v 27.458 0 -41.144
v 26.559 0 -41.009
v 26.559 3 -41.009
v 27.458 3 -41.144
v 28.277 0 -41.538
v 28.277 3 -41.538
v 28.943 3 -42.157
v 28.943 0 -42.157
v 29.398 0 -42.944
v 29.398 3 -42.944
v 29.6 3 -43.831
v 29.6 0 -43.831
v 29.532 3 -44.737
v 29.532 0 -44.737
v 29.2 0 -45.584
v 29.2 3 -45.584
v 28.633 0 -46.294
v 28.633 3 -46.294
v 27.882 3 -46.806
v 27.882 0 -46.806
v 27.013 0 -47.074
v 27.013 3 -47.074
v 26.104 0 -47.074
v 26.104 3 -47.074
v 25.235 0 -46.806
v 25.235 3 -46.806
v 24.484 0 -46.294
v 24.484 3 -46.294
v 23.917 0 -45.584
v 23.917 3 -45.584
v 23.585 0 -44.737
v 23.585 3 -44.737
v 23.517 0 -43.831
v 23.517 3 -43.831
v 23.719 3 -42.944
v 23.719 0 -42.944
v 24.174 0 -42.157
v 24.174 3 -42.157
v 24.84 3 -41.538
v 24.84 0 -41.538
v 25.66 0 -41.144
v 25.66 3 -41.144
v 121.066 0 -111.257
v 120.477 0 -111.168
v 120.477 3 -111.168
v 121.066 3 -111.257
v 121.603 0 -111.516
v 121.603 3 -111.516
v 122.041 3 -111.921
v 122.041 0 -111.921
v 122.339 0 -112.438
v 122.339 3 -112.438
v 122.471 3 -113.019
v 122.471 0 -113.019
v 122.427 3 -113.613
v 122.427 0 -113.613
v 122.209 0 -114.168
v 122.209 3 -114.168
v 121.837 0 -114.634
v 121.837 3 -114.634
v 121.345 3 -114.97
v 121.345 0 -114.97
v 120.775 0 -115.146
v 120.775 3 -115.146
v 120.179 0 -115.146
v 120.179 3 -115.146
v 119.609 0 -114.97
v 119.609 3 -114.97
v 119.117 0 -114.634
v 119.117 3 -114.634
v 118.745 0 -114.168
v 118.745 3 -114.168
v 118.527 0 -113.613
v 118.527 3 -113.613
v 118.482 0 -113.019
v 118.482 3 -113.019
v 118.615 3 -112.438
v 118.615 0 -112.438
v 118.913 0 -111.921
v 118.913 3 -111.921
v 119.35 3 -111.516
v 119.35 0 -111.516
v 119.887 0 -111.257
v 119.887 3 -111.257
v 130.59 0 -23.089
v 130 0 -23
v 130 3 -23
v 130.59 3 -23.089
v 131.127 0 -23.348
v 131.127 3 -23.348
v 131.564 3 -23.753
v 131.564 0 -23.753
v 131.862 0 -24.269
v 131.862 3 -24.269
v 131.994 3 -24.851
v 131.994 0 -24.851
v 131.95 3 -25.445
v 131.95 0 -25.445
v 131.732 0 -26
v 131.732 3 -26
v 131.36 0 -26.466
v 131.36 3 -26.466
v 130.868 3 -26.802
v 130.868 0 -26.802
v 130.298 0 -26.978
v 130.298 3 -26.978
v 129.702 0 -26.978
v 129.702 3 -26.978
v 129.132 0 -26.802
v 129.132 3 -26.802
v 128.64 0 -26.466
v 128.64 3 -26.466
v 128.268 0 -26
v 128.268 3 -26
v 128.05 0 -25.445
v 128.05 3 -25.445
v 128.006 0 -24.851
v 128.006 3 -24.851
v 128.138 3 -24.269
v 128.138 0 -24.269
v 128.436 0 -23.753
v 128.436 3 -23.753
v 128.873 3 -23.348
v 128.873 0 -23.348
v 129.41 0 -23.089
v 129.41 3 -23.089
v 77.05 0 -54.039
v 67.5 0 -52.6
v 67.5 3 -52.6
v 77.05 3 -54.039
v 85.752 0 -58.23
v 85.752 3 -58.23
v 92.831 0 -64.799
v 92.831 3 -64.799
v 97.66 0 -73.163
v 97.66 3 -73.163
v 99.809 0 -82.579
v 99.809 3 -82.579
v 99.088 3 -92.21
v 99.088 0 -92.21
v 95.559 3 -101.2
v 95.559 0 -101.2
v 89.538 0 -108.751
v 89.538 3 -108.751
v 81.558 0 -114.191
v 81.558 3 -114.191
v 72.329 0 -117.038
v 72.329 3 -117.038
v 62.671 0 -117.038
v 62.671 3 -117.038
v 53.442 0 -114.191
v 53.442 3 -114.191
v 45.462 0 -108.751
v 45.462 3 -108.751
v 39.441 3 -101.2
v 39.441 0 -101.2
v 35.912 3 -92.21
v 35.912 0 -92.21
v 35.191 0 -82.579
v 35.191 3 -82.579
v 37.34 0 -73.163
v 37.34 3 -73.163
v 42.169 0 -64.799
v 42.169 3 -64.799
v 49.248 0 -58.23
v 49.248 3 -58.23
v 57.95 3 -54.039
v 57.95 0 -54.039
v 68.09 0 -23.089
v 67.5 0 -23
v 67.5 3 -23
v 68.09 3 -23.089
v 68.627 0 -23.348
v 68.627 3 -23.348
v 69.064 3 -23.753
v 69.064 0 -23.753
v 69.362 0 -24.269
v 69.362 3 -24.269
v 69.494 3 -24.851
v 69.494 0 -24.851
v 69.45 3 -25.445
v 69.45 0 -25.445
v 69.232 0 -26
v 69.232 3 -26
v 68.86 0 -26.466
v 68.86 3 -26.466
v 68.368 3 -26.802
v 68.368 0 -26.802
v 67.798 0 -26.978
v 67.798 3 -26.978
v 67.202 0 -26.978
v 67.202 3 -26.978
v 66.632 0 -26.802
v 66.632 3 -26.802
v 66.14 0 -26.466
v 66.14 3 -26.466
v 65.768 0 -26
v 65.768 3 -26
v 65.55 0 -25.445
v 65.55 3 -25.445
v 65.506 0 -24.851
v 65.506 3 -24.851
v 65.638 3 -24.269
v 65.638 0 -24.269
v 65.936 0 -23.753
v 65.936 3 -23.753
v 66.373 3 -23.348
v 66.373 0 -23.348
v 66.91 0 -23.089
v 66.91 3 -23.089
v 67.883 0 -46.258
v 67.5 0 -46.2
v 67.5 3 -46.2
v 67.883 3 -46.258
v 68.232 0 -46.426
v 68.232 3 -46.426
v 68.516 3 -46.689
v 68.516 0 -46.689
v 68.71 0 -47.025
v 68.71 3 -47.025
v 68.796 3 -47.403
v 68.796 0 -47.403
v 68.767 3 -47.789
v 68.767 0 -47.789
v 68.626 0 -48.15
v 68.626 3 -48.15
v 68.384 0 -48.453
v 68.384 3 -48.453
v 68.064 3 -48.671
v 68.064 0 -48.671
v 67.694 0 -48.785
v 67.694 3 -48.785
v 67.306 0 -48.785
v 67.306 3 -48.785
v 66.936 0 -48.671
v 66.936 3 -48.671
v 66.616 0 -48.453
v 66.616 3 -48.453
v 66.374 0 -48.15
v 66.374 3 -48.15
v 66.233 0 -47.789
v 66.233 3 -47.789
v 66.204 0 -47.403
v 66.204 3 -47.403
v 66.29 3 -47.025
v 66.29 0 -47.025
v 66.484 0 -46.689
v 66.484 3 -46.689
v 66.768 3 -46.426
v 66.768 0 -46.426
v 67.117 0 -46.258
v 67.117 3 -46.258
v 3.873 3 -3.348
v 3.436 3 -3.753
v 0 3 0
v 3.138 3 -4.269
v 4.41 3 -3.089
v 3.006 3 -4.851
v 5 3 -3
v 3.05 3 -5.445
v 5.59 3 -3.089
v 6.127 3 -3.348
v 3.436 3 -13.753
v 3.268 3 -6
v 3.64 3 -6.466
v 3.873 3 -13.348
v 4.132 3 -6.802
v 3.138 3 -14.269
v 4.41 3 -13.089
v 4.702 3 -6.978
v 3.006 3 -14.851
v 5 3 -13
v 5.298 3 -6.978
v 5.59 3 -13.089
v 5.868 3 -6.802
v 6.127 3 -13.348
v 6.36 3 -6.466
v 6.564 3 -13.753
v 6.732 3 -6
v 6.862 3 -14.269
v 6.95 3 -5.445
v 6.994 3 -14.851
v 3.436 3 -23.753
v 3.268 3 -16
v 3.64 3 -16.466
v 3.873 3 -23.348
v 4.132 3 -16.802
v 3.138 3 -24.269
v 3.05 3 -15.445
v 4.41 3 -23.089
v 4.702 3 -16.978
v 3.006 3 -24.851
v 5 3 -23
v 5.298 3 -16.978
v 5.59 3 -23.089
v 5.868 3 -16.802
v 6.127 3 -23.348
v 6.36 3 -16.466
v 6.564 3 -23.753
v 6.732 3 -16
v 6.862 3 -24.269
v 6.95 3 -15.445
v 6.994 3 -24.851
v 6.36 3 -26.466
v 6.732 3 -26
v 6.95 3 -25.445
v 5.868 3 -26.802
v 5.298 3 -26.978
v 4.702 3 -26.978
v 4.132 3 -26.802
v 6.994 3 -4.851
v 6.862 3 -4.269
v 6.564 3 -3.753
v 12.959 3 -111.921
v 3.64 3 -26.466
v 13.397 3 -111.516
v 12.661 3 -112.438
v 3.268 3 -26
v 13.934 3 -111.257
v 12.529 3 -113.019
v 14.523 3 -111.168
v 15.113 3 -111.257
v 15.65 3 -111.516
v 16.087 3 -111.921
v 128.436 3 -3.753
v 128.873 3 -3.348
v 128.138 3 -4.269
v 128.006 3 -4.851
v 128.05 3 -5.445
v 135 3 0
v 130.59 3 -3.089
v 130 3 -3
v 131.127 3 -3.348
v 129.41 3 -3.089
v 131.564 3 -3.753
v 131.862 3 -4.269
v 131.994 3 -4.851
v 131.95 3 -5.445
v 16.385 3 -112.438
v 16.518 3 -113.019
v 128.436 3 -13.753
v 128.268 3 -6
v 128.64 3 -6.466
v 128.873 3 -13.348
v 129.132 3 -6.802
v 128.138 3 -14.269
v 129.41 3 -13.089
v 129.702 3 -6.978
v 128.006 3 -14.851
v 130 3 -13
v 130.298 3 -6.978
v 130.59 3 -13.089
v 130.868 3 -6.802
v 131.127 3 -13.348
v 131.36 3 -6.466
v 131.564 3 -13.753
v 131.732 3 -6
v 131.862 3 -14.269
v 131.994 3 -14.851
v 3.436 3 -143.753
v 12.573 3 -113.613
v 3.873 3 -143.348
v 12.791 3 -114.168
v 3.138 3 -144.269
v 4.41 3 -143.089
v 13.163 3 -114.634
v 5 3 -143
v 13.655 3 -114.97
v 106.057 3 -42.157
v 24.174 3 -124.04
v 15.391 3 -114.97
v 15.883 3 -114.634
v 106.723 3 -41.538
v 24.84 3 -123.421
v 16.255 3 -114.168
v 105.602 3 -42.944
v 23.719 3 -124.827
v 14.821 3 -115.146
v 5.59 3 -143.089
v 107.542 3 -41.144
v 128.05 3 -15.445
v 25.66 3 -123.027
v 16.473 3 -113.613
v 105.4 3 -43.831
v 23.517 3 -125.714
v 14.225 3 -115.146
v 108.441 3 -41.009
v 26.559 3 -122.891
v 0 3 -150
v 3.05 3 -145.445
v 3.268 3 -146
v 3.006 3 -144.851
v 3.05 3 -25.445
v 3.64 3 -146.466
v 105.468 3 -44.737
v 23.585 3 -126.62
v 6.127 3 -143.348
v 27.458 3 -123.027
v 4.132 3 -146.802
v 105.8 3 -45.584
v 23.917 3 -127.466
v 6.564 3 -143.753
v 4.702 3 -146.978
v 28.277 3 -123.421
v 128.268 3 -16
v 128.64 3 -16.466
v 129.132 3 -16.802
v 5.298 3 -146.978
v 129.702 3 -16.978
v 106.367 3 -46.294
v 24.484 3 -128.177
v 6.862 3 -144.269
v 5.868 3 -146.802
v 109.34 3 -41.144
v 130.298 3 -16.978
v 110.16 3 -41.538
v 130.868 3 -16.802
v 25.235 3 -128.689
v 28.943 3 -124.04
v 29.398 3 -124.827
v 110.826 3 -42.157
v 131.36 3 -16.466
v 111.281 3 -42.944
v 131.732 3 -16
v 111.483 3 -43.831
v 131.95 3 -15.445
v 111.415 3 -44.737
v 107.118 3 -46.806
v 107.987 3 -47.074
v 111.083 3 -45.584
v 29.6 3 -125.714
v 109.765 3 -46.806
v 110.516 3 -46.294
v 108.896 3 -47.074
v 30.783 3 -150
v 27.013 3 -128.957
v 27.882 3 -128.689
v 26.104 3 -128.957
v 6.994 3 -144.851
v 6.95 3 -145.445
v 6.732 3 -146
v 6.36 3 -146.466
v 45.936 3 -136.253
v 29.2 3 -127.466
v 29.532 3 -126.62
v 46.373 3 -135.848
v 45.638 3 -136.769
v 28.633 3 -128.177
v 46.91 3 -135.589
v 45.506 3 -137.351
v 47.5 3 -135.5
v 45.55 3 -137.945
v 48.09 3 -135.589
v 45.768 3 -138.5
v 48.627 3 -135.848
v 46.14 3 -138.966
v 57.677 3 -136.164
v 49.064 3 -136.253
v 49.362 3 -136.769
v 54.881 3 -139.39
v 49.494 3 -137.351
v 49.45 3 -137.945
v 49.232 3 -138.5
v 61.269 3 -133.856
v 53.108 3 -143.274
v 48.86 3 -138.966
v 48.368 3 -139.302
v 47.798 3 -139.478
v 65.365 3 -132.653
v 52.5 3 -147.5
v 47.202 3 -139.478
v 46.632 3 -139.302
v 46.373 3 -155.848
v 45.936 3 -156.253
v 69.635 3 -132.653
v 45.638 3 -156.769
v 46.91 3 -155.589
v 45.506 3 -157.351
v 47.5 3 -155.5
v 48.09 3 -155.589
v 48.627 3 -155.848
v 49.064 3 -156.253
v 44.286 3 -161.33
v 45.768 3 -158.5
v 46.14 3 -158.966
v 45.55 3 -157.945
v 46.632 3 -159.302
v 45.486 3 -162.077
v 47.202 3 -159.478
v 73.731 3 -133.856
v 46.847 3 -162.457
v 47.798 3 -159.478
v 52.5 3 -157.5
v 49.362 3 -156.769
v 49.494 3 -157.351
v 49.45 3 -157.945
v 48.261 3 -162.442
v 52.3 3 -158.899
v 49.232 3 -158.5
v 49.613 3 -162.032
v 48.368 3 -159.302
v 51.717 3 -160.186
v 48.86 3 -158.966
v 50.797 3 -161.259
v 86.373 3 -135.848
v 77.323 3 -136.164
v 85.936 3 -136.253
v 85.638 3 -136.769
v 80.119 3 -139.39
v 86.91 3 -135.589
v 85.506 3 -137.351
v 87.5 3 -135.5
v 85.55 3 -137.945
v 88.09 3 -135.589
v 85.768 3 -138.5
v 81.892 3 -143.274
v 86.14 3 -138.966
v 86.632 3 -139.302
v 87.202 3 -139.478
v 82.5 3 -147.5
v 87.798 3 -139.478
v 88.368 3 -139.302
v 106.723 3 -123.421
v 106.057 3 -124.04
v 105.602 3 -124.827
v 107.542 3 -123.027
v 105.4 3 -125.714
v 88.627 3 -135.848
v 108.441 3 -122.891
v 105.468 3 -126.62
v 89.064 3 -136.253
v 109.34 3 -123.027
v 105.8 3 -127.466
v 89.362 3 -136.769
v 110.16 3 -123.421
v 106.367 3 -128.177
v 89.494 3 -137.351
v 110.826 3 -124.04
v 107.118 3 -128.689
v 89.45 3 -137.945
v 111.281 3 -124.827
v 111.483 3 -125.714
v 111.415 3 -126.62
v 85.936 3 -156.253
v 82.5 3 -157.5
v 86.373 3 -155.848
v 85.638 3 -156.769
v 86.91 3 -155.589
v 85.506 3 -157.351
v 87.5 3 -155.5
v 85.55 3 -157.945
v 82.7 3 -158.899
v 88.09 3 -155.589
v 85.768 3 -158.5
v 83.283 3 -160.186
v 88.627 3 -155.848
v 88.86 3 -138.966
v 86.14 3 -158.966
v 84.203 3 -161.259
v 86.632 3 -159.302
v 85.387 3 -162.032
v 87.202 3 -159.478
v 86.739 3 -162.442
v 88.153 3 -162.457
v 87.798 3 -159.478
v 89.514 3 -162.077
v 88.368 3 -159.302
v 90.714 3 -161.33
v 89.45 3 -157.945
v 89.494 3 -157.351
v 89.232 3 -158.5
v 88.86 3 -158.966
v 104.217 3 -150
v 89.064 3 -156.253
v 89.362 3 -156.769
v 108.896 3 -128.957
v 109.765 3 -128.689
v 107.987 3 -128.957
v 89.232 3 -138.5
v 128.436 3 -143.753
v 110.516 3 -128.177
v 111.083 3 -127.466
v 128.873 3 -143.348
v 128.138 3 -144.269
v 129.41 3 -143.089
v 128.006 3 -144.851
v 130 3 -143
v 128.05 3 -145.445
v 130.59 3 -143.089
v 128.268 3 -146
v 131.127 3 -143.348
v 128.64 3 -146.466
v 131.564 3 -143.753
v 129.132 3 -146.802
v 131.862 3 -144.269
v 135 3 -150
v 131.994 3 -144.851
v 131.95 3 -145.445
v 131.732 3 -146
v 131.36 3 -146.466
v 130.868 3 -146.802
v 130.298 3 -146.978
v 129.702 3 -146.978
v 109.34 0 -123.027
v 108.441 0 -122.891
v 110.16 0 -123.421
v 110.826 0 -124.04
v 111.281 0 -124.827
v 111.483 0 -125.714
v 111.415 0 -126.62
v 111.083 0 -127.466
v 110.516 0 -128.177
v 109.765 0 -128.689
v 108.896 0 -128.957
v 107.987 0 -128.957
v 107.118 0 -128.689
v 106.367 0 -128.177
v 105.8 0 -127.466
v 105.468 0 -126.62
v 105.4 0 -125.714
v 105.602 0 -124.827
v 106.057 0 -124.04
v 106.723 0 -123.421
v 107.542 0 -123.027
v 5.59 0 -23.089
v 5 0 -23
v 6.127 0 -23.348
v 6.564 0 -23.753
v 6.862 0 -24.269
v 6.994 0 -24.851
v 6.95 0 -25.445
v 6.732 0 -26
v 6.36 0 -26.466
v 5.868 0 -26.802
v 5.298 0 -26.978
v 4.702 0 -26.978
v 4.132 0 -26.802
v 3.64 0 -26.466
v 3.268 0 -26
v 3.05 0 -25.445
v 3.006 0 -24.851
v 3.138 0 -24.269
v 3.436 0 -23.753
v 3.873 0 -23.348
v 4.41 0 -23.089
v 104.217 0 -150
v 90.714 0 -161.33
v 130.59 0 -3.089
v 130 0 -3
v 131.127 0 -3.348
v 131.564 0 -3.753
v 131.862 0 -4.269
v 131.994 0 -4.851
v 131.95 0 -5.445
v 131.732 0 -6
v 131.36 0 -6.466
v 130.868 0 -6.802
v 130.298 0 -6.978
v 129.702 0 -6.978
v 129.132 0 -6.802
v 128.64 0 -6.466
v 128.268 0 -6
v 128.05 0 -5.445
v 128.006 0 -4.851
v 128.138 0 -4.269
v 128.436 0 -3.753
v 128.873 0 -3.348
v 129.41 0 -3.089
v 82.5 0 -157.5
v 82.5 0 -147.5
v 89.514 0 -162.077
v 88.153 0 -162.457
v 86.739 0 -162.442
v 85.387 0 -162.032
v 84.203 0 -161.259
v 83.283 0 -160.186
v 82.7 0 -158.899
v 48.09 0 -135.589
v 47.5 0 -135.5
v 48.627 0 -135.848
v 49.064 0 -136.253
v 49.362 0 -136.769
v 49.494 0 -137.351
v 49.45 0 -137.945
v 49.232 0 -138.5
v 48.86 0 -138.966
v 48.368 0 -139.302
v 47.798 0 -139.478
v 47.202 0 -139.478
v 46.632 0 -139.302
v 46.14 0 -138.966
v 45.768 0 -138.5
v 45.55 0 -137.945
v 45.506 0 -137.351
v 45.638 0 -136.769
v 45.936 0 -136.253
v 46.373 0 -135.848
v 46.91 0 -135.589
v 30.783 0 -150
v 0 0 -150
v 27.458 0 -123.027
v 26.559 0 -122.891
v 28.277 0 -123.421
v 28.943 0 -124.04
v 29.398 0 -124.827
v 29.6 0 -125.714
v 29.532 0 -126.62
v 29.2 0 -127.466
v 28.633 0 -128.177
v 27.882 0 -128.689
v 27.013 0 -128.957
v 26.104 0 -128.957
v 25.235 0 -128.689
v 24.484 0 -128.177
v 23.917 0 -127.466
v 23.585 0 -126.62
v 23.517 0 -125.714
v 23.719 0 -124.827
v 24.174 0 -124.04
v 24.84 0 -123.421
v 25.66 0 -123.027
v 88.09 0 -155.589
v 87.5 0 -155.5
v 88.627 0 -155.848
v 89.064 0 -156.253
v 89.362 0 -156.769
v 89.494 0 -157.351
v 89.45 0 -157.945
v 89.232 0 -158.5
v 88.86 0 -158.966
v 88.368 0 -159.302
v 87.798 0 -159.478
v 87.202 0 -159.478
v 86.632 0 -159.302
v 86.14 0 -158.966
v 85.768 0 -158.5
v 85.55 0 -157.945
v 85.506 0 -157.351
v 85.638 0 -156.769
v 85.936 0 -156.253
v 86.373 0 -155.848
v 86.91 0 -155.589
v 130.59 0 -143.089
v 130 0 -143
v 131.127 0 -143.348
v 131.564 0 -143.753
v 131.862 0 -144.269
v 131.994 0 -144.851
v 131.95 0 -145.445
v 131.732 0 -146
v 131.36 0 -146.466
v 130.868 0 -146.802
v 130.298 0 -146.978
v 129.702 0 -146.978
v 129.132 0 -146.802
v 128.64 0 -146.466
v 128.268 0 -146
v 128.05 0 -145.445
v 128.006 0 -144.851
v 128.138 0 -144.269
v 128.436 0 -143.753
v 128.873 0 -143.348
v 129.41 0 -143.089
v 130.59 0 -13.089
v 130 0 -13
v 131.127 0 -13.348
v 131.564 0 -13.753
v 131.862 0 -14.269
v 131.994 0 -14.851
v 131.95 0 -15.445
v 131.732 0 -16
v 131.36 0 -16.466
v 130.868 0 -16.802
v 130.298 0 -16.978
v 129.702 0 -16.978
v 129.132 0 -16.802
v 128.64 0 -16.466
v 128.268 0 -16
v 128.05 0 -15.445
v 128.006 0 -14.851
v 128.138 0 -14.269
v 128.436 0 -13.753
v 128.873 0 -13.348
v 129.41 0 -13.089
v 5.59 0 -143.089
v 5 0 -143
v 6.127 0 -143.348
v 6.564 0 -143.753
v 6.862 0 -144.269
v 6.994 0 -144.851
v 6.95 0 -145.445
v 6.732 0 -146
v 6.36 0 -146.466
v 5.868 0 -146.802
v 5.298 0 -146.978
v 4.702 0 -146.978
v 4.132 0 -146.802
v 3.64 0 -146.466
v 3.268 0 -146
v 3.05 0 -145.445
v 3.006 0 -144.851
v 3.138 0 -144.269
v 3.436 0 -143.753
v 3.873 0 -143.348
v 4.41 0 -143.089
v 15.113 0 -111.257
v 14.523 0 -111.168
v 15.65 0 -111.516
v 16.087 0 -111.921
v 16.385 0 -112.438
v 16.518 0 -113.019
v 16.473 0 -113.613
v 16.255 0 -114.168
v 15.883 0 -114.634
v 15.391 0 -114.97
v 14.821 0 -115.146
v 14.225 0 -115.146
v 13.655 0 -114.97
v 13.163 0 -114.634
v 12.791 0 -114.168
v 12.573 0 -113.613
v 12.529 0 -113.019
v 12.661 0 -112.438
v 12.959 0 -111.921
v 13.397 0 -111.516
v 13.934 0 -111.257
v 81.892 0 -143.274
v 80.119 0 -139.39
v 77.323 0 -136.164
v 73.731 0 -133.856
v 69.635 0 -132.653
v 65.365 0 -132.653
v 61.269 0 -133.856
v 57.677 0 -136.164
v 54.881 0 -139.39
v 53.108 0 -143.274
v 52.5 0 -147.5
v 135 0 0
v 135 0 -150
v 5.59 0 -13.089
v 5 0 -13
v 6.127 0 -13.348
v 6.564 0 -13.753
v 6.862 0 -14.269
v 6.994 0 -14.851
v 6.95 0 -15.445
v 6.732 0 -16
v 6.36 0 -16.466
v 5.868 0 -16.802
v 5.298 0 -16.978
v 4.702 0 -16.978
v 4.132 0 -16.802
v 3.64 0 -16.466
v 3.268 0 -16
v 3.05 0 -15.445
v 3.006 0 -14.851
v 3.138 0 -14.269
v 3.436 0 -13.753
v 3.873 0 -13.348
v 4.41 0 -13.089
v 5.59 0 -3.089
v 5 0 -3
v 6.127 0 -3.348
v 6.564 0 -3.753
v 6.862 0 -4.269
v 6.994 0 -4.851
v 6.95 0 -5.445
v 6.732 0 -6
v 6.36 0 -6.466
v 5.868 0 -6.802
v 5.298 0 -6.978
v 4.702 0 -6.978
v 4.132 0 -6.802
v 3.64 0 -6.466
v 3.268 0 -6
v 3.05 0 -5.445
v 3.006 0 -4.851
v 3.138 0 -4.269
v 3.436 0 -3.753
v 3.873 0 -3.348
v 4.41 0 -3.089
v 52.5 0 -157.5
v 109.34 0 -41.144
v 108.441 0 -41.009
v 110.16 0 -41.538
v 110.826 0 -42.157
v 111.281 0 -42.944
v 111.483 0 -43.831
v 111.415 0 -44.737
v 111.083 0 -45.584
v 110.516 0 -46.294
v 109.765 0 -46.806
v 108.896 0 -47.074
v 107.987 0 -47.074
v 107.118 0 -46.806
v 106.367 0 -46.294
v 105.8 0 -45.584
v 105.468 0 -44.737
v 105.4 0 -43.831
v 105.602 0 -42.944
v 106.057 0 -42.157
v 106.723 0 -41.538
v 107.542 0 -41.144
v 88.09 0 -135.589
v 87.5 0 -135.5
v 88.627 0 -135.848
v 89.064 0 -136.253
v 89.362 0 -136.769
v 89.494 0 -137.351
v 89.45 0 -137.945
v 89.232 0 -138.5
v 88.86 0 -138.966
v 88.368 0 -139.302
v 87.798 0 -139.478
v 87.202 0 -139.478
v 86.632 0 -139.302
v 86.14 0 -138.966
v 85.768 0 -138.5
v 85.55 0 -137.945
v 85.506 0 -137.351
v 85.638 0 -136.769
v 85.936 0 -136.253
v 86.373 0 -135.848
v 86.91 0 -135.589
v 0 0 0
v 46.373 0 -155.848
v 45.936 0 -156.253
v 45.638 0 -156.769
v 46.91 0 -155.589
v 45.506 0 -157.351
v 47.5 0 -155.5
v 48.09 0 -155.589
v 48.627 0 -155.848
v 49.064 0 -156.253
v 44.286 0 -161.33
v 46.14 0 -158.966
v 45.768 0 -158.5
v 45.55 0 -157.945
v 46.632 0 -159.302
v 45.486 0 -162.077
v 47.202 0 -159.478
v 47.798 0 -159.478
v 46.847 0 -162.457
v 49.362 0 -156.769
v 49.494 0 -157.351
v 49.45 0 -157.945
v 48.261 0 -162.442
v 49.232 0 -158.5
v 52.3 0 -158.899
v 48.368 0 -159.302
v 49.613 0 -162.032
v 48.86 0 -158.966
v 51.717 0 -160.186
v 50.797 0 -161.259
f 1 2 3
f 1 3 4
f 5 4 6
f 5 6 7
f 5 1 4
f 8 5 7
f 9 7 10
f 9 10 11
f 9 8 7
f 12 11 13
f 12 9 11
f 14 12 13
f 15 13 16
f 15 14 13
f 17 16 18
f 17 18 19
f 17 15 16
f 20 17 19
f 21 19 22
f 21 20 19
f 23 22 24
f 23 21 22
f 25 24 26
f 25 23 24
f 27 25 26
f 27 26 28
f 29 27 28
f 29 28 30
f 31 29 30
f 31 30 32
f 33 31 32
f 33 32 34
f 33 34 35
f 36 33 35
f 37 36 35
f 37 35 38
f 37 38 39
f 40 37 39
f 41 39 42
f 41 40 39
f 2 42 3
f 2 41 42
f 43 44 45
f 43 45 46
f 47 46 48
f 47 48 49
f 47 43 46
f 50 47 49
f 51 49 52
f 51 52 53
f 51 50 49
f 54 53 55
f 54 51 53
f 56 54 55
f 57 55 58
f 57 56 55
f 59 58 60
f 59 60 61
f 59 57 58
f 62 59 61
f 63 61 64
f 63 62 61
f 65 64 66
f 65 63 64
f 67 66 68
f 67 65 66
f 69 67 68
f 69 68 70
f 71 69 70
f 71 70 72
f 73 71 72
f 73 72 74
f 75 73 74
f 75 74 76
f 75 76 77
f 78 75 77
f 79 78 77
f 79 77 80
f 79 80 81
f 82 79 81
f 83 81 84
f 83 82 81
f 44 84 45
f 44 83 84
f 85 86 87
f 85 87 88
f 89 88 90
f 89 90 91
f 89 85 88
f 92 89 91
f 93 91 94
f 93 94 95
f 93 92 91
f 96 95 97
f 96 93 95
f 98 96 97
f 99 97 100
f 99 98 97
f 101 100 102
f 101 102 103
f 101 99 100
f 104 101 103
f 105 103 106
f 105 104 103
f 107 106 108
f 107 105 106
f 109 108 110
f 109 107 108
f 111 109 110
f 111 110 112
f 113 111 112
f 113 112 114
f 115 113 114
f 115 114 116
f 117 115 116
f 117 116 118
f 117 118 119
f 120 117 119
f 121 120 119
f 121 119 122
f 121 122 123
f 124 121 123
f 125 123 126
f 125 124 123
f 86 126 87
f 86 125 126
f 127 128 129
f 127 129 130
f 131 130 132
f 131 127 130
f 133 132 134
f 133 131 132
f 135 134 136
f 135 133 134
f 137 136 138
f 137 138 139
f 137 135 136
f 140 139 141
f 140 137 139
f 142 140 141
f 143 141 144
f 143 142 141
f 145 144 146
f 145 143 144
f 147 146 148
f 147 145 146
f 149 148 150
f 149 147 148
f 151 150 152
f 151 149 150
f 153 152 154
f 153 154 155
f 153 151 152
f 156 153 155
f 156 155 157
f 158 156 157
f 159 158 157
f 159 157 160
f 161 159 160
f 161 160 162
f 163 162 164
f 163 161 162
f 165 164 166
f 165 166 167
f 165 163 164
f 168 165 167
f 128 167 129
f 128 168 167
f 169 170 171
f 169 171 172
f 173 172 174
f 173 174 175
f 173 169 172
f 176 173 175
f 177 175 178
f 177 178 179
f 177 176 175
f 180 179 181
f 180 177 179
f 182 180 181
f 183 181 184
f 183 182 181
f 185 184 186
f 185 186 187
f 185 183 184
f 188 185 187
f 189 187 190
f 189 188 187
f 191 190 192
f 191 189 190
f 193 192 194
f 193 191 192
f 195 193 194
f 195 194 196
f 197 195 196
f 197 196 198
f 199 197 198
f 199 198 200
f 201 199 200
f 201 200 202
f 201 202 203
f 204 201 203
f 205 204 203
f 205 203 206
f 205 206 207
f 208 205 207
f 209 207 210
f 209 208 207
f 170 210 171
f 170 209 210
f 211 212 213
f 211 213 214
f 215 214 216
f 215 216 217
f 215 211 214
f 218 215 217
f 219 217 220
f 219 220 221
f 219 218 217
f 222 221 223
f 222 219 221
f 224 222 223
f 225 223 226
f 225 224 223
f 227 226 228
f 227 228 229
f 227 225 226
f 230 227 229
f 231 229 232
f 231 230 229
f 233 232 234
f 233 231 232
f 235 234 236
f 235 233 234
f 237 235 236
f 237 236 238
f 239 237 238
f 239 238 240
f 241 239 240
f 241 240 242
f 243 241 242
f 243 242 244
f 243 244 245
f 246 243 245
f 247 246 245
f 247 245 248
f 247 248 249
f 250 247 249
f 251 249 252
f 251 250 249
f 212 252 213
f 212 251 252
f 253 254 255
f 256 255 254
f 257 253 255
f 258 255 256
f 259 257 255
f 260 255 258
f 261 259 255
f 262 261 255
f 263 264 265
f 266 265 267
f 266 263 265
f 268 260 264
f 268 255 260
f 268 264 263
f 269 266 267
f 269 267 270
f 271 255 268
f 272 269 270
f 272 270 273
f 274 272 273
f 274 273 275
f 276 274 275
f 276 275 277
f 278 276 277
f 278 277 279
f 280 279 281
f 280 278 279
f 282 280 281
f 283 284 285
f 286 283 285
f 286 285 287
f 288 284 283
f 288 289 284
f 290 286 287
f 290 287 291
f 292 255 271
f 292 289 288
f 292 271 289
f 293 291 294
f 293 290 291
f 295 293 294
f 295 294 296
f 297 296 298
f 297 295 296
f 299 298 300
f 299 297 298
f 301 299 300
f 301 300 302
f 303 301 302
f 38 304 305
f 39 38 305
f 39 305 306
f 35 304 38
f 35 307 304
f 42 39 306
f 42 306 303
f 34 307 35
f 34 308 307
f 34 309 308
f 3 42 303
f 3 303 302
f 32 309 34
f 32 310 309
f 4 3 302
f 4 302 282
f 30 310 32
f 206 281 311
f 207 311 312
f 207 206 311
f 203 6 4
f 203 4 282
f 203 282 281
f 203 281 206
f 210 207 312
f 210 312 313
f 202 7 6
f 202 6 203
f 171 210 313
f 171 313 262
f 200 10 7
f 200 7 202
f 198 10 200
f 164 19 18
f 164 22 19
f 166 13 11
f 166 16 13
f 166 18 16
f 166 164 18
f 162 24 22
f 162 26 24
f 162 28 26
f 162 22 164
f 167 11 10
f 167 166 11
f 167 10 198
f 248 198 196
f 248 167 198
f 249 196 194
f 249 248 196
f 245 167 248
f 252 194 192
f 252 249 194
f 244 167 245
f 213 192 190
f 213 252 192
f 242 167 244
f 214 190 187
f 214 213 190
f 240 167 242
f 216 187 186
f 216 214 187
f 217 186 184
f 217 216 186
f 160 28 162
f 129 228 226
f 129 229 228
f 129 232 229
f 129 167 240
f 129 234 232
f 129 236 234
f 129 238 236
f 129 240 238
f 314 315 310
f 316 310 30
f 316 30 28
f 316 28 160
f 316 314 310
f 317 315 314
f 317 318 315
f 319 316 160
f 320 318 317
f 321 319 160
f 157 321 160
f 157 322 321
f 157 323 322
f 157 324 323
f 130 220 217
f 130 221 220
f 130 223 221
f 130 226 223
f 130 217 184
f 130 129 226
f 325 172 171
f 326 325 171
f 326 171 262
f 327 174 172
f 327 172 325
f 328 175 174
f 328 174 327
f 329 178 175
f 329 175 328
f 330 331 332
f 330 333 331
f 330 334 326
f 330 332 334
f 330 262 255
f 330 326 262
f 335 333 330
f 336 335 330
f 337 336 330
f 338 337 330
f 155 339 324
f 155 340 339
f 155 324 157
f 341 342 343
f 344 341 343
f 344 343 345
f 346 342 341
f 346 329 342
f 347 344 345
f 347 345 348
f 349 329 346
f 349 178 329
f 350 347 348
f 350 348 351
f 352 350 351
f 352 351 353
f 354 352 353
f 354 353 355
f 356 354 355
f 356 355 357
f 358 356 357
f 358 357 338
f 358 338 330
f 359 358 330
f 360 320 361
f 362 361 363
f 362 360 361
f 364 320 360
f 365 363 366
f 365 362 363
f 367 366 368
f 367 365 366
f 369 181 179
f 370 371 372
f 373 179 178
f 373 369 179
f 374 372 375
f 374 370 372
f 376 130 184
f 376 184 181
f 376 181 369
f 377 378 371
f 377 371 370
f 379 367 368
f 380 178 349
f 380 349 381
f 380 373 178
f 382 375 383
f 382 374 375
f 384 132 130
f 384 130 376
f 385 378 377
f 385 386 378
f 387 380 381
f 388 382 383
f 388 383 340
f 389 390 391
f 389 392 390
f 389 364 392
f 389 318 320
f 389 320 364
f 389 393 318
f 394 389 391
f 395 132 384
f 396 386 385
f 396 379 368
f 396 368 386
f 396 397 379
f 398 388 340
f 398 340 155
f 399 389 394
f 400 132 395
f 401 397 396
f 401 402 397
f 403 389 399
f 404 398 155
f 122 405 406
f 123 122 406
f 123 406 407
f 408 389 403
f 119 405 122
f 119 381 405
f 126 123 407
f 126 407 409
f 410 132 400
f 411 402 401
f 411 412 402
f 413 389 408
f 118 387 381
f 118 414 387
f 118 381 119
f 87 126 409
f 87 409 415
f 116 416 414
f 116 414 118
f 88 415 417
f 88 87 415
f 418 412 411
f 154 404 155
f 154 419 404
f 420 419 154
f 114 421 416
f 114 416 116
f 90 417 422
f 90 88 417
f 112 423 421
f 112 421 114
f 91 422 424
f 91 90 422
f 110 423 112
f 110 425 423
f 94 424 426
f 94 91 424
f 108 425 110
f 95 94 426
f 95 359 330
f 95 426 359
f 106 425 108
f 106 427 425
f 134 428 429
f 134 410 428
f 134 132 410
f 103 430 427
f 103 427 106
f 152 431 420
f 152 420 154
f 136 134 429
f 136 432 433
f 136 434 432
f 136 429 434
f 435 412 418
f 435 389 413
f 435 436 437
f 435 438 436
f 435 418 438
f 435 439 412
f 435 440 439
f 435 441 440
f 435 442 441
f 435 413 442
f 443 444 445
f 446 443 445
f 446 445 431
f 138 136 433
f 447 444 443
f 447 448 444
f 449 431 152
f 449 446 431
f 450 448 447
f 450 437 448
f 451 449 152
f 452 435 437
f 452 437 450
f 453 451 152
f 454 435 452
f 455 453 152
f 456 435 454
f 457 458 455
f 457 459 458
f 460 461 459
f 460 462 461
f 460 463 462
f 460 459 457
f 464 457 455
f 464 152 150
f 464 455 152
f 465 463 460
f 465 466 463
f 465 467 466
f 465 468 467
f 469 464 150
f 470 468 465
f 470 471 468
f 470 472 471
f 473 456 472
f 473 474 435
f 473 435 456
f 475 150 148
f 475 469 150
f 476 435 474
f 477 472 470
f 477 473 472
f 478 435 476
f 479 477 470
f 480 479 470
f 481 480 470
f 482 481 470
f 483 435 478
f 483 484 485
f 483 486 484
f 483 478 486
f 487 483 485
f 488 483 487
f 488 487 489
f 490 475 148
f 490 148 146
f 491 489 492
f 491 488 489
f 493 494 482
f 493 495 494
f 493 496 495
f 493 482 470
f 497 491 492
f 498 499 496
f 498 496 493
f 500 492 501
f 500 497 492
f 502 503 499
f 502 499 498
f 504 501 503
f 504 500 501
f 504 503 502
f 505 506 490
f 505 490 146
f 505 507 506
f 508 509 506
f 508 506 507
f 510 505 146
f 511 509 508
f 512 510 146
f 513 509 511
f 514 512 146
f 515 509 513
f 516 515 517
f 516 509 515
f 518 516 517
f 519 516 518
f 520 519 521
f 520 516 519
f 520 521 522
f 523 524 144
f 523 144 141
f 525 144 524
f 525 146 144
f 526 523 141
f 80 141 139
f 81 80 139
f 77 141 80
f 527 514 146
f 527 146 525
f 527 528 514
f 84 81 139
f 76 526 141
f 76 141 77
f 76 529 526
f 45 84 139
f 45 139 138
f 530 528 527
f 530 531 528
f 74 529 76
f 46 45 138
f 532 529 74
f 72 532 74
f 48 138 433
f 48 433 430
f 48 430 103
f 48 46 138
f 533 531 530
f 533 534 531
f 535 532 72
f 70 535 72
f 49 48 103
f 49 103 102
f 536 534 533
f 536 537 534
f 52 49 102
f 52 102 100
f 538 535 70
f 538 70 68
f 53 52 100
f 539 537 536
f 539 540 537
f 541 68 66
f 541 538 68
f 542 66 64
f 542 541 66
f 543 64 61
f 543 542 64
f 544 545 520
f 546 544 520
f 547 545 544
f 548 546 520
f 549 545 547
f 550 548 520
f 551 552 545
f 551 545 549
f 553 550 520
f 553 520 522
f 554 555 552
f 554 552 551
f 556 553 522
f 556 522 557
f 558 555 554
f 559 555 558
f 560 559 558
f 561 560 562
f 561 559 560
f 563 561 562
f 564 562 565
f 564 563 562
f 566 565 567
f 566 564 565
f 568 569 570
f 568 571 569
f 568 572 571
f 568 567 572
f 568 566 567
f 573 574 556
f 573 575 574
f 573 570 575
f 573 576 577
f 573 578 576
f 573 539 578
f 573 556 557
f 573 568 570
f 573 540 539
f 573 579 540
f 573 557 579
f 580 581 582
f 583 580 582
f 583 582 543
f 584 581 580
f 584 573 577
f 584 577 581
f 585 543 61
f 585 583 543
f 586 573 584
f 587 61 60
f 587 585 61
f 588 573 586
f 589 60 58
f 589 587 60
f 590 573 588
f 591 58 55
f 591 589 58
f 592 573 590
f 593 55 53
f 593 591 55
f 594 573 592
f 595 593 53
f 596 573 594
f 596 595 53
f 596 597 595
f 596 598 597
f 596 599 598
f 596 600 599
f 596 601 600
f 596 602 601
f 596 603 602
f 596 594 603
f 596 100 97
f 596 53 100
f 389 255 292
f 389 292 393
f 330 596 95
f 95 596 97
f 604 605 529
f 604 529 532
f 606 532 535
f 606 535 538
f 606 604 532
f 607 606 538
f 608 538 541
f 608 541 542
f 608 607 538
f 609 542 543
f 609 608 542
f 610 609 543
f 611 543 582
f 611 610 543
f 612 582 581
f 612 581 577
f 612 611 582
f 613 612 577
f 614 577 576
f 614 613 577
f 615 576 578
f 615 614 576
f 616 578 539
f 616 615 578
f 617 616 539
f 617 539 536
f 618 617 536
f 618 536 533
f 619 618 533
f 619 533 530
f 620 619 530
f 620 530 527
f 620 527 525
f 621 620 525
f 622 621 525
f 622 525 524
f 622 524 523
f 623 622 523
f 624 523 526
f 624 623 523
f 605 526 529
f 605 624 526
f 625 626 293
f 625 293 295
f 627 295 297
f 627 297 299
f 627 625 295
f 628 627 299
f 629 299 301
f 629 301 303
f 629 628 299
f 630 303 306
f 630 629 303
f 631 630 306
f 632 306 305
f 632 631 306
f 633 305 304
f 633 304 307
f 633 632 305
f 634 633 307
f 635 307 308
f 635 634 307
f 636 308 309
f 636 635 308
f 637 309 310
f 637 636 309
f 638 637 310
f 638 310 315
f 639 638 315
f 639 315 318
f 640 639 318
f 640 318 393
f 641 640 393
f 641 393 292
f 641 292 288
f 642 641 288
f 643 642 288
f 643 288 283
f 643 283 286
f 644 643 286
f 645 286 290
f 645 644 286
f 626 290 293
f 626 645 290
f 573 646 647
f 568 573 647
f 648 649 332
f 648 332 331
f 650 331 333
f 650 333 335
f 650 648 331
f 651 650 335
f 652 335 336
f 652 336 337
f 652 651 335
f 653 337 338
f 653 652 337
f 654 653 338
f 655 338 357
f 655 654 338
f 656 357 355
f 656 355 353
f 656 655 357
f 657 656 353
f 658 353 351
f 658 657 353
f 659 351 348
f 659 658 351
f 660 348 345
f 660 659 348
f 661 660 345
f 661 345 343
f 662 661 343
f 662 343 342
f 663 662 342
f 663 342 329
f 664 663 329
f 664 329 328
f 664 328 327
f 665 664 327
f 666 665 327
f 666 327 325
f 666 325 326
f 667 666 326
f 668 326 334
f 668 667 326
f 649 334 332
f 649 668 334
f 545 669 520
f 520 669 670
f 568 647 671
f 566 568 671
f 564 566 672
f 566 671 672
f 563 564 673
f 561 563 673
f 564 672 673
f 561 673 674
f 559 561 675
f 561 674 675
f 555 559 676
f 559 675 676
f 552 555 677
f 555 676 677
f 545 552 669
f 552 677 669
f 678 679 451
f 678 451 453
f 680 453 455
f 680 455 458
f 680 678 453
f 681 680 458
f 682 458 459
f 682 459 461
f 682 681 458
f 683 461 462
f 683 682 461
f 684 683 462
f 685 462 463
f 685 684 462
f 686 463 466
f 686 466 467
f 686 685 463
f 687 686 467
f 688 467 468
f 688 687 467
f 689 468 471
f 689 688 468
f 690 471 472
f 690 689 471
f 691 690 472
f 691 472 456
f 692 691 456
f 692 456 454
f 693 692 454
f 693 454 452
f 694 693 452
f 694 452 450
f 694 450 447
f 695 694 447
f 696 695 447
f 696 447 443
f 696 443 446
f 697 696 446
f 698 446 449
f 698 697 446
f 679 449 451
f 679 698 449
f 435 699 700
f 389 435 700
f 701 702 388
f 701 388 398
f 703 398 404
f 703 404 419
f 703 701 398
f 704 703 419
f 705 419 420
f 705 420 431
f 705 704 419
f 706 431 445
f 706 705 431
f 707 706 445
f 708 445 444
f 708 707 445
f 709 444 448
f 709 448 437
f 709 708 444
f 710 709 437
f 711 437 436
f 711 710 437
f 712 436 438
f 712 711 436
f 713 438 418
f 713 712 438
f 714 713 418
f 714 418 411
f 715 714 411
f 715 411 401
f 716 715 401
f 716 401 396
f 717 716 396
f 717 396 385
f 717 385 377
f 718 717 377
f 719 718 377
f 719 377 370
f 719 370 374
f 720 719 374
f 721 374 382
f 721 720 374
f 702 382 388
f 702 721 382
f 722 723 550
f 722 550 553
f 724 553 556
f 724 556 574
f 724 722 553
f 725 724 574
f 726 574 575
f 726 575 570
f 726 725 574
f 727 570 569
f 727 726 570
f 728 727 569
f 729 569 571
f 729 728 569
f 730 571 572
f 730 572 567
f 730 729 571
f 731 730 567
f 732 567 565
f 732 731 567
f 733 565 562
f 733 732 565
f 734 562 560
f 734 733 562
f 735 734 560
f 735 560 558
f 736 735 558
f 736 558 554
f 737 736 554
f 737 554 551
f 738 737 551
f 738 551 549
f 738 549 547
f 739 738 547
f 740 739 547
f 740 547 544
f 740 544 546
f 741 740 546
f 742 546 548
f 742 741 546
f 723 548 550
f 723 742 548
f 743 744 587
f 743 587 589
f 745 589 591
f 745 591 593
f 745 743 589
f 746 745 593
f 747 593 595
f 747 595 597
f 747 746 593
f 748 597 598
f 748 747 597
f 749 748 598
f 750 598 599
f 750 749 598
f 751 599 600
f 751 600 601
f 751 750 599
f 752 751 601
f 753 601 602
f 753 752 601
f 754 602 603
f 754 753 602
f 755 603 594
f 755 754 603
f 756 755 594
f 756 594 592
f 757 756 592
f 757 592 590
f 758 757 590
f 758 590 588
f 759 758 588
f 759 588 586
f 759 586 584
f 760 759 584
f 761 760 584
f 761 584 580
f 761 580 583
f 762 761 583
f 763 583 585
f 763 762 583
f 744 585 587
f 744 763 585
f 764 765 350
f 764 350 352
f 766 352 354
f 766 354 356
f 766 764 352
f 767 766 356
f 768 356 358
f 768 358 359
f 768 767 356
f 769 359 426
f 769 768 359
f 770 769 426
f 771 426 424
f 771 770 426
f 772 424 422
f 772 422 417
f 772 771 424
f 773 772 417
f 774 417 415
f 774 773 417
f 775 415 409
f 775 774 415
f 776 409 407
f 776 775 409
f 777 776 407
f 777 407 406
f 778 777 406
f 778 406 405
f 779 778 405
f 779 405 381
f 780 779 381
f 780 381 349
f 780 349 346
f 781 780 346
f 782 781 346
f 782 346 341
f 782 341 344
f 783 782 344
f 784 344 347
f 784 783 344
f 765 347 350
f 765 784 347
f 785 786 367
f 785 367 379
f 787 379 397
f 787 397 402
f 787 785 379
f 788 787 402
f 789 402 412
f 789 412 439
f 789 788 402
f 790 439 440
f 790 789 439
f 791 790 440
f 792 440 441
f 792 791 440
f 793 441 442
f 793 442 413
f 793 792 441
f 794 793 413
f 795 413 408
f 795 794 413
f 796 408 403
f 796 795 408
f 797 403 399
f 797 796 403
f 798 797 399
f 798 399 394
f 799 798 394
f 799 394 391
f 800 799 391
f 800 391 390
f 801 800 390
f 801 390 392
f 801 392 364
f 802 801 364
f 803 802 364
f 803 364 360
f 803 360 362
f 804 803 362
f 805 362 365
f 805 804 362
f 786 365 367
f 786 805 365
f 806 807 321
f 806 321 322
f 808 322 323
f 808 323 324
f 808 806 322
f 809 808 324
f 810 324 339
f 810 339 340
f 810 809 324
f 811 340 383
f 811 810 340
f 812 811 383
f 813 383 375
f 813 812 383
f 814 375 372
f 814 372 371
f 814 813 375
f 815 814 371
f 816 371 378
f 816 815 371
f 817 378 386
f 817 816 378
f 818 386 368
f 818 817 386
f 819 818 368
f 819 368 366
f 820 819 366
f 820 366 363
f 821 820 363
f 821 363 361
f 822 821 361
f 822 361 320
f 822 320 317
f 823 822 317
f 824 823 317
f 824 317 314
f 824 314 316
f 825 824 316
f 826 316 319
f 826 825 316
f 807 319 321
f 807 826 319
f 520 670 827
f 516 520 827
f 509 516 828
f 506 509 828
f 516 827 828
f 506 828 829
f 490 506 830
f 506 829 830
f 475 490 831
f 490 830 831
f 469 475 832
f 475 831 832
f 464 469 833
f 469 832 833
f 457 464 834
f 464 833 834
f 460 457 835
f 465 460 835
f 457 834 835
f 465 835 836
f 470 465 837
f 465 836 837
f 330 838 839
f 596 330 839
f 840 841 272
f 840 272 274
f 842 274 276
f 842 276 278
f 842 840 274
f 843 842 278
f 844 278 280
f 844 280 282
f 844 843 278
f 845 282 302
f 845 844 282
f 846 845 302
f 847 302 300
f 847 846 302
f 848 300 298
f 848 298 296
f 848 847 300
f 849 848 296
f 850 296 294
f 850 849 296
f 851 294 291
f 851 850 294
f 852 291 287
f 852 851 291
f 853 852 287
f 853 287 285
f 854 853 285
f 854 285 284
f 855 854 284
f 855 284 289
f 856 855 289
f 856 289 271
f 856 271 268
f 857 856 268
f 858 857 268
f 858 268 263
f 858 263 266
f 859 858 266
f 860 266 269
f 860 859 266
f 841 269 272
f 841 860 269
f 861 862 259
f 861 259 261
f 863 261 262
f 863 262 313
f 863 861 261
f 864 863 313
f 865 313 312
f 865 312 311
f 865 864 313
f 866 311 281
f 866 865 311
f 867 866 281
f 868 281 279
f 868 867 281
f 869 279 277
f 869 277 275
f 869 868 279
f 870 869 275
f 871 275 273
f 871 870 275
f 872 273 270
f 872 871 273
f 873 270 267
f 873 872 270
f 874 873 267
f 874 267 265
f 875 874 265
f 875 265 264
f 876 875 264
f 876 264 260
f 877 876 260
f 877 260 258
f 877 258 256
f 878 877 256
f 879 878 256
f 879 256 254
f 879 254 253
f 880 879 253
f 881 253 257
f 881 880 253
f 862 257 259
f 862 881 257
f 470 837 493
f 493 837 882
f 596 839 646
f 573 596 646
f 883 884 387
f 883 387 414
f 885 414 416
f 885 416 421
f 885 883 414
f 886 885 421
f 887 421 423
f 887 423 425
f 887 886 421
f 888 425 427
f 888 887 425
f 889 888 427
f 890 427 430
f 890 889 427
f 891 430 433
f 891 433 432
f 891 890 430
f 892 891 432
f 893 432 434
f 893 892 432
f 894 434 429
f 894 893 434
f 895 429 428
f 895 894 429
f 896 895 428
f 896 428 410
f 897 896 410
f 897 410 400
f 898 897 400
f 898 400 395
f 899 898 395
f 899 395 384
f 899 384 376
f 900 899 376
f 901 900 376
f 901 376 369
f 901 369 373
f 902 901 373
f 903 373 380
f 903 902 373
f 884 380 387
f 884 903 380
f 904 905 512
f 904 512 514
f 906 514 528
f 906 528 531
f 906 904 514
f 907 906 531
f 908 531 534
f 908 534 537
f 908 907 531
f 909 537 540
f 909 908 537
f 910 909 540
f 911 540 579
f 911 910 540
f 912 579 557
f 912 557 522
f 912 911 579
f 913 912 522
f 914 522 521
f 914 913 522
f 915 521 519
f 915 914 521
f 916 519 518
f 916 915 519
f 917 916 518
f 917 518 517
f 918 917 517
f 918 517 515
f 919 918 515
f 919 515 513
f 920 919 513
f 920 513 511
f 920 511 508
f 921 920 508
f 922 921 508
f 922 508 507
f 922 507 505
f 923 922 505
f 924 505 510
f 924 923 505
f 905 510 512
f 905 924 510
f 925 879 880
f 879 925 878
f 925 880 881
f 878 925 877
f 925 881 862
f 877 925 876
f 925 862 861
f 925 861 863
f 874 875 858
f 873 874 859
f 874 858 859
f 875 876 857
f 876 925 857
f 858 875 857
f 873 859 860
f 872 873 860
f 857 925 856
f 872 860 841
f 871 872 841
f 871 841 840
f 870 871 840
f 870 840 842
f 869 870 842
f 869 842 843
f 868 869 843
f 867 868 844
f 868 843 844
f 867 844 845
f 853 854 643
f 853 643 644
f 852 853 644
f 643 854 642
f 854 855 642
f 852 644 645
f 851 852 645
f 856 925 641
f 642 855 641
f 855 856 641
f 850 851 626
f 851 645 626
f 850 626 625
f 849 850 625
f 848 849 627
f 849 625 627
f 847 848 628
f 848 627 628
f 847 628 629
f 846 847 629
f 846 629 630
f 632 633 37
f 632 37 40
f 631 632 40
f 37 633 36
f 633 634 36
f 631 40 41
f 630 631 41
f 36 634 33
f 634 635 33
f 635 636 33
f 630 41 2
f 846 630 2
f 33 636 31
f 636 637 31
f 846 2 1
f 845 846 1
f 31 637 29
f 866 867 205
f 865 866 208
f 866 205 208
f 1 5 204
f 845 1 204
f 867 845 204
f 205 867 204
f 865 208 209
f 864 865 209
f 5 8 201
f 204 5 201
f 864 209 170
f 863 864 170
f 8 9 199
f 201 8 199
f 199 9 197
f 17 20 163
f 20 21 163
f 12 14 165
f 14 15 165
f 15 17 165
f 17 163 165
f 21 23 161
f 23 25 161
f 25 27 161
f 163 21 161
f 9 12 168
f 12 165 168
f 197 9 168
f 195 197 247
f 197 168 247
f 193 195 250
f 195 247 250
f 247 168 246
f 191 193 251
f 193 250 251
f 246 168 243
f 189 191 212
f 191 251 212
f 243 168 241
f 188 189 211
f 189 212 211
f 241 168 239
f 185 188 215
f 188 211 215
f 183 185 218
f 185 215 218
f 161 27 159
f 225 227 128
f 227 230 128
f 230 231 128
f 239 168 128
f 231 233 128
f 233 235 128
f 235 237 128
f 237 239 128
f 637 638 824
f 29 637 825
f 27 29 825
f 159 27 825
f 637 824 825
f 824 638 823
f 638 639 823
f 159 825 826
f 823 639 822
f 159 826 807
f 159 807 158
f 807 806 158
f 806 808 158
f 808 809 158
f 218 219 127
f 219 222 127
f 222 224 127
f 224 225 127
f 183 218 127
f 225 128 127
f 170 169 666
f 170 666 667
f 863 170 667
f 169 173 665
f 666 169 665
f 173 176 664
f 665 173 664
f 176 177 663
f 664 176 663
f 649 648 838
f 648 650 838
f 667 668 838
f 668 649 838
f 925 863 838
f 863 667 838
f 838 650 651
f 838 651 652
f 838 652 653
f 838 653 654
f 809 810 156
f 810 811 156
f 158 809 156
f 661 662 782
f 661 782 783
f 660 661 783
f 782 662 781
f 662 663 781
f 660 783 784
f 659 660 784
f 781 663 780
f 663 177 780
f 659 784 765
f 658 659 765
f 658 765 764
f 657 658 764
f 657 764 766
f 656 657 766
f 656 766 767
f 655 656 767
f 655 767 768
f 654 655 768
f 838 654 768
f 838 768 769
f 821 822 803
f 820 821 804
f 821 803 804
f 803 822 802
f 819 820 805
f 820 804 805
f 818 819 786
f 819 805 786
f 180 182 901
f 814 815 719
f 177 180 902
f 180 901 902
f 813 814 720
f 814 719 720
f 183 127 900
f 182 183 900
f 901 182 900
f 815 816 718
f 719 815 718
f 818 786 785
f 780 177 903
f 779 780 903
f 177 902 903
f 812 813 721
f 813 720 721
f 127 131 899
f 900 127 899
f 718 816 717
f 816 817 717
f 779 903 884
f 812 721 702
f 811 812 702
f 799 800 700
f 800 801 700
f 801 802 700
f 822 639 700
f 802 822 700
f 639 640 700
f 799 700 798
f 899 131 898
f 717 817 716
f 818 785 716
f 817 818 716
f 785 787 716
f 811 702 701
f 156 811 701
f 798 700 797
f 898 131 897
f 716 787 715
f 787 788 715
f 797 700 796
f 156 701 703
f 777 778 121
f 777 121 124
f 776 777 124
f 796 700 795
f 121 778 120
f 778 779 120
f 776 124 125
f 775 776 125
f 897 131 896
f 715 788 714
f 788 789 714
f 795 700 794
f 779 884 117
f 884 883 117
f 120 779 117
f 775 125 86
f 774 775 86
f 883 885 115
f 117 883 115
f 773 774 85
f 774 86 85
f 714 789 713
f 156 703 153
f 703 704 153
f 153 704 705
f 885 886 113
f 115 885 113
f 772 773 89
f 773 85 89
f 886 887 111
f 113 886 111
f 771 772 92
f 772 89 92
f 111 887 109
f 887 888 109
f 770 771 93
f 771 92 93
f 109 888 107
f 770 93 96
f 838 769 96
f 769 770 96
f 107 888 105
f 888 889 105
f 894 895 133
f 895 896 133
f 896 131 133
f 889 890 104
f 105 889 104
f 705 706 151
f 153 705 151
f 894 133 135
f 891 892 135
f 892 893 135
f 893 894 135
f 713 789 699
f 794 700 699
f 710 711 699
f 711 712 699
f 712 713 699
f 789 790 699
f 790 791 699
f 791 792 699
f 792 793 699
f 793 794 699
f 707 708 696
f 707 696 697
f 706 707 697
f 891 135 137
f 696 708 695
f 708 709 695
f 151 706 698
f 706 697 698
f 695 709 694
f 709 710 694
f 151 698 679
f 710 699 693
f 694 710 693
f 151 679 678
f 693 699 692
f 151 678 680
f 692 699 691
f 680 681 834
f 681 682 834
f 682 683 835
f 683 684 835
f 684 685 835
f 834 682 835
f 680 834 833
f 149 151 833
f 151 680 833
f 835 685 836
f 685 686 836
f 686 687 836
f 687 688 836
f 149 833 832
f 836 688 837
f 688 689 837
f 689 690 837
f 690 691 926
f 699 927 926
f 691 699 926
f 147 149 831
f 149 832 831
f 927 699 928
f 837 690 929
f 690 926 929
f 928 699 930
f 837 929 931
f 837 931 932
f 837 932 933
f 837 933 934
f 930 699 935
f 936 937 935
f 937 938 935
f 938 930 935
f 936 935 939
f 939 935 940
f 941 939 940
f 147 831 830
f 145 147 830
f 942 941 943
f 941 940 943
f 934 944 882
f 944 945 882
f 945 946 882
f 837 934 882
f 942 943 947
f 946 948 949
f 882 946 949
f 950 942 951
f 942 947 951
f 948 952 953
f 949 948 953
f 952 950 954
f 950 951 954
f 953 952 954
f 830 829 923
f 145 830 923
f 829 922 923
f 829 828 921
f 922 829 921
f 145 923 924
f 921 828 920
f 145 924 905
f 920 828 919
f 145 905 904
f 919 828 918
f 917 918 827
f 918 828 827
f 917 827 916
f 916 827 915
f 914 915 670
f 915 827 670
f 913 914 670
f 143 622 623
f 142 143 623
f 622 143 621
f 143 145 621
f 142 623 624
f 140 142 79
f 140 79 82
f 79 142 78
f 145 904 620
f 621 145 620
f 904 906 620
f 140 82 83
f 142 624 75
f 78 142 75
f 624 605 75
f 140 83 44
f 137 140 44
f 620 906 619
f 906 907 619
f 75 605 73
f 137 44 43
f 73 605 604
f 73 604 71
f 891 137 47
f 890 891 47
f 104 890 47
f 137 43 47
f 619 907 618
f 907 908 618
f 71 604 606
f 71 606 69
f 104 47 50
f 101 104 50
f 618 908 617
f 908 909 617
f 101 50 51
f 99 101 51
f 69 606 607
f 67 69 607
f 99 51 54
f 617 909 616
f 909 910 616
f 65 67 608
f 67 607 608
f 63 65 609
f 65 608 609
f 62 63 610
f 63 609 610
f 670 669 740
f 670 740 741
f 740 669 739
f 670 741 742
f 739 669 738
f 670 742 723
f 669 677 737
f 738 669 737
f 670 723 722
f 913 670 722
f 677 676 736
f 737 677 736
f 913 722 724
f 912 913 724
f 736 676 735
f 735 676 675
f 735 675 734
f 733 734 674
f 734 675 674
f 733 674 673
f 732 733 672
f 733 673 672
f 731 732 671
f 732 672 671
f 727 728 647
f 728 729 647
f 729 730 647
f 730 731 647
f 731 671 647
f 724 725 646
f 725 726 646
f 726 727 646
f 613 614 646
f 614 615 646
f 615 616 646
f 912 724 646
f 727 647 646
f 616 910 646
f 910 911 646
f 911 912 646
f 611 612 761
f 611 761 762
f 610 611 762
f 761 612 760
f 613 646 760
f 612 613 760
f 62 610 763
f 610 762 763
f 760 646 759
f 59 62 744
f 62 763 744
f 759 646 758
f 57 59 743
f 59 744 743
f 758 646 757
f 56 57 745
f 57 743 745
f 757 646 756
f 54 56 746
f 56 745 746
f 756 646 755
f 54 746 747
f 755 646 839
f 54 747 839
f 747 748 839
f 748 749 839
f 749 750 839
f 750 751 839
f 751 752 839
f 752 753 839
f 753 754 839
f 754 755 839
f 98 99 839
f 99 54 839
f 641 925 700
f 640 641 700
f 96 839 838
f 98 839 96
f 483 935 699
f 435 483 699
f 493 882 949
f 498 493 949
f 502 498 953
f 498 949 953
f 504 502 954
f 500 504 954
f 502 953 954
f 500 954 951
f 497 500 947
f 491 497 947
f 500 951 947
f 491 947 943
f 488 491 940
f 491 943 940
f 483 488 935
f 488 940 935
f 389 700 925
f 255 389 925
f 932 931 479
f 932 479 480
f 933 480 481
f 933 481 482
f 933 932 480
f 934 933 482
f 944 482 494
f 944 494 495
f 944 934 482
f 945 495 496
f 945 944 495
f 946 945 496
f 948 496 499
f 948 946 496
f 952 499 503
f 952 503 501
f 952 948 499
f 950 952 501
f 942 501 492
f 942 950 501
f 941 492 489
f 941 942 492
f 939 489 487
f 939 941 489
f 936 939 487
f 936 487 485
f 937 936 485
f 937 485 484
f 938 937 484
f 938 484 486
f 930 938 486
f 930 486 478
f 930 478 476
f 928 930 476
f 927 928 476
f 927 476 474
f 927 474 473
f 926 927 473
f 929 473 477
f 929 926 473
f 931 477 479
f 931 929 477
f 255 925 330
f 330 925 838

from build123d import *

# Parameters (mm, degrees)
SKETCH_1_R      = 2
SKETCH_1_R_2    = 3.05
SKETCH_1_R_3    = 1.3
SKETCH_1_R_4    = 32.4
EXTRUDE_1_DEPTH = 3


with BuildPart() as part:
    # ｽｹｯﾁ1 → ﾎﾞｽ - 押し出し1 (new body)
    with BuildSketch(Plane(origin=(0, 0, 0), x_dir=(1, 0, 0), z_dir=(0, 1, 0))):
        with BuildLine():
            Line((0, 150), (0, 0))
            Line((0, 0), (135, 0))
            Line((135, 0), (135, 150))
            Line((135, 150), (104.216771079, 150))
            Line((104.216771079, 150), (90.713938048, 161.330222216))
            ThreePointArc((90.713938048, 161.330222216), (85.386908691, 162.031538935), (82.5, 157.5))
            Line((82.5, 157.5), (82.5, 147.5))
            ThreePointArc((82.5, 147.5), (67.5, 132.5), (52.5, 147.5))
            Line((52.5, 147.5), (52.5, 150))
            Line((52.5, 150), (52.5, 157.5))
            ThreePointArc((52.5, 157.5), (49.613091309, 162.031538935), (44.286061952, 161.330222216))
            Line((44.286061952, 161.330222216), (30.783228921, 150))
            Line((30.783228921, 150), (0, 150))
        make_face()
        with Locations(Location((5, 5, 0), (0, 0, 270))):
            Circle(SKETCH_1_R, mode=Mode.SUBTRACT)
        with Locations(Location((5, 15, 0), (0, 0, 270))):
            Circle(SKETCH_1_R, mode=Mode.SUBTRACT)
        with Locations(Location((5, 25, 0), (0, 0, 270))):
            Circle(SKETCH_1_R, mode=Mode.SUBTRACT)
        with Locations(Location((26.558517369, 44.058517369, 0), (0, 0, 270))):
            Circle(SKETCH_1_R_2, mode=Mode.SUBTRACT)
        with Locations(Location((67.5, 25, 0), (0, 0, 270))):
            Circle(SKETCH_1_R, mode=Mode.SUBTRACT)
        with Locations(Location((130, 5, 0), (0, 0, 270))):
            Circle(SKETCH_1_R, mode=Mode.SUBTRACT)
        with Locations(Location((130, 15, 0), (0, 0, 270))):
            Circle(SKETCH_1_R, mode=Mode.SUBTRACT)
        with Locations(Location((130, 25, 0), (0, 0, 270))):
            Circle(SKETCH_1_R, mode=Mode.SUBTRACT)
        with Locations(Location((67.5, 47.5, 0), (0, 0, 270))):
            Circle(SKETCH_1_R_3, mode=Mode.SUBTRACT)
        with Locations(Location((108.441482631, 44.058517369, 0), (0, 0, 270))):
            Circle(SKETCH_1_R_2, mode=Mode.SUBTRACT)
        with Locations(Location((14.523144428, 113.168293767, 0), (0, 0, 270))):
            Circle(SKETCH_1_R, mode=Mode.SUBTRACT)
        with Locations(Location((67.5, 85, 0), (0, 0, 270))):
            Circle(SKETCH_1_R_4, mode=Mode.SUBTRACT)
        with Locations(Location((26.558517369, 125.941482631, 0), (0, 0, 270))):
            Circle(SKETCH_1_R_2, mode=Mode.SUBTRACT)
        with Locations(Location((5, 145, 0), (0, 0, 270))):
            Circle(SKETCH_1_R, mode=Mode.SUBTRACT)
        with Locations(Location((47.5, 137.5, 0), (0, 0, 270))):
            Circle(SKETCH_1_R, mode=Mode.SUBTRACT)
        with Locations(Location((47.5, 157.5, 0), (0, 0, 270))):
            Circle(SKETCH_1_R, mode=Mode.SUBTRACT)
        with Locations(Location((120.476855572, 113.168293767, 0), (0, 0, 270))):
            Circle(SKETCH_1_R, mode=Mode.SUBTRACT)
        with Locations(Location((87.5, 137.5, 0), (0, 0, 270))):
            Circle(SKETCH_1_R, mode=Mode.SUBTRACT)
        with Locations(Location((108.441482631, 125.941482631, 0), (0, 0, 270))):
            Circle(SKETCH_1_R_2, mode=Mode.SUBTRACT)
        with Locations(Location((130, 145, 0), (0, 0, 270))):
            Circle(SKETCH_1_R, mode=Mode.SUBTRACT)
        with Locations(Location((87.5, 157.5, 0), (0, 0, 270))):
            Circle(SKETCH_1_R, mode=Mode.SUBTRACT)
    extrude(amount=EXTRUDE_1_DEPTH)


solid = part.part
